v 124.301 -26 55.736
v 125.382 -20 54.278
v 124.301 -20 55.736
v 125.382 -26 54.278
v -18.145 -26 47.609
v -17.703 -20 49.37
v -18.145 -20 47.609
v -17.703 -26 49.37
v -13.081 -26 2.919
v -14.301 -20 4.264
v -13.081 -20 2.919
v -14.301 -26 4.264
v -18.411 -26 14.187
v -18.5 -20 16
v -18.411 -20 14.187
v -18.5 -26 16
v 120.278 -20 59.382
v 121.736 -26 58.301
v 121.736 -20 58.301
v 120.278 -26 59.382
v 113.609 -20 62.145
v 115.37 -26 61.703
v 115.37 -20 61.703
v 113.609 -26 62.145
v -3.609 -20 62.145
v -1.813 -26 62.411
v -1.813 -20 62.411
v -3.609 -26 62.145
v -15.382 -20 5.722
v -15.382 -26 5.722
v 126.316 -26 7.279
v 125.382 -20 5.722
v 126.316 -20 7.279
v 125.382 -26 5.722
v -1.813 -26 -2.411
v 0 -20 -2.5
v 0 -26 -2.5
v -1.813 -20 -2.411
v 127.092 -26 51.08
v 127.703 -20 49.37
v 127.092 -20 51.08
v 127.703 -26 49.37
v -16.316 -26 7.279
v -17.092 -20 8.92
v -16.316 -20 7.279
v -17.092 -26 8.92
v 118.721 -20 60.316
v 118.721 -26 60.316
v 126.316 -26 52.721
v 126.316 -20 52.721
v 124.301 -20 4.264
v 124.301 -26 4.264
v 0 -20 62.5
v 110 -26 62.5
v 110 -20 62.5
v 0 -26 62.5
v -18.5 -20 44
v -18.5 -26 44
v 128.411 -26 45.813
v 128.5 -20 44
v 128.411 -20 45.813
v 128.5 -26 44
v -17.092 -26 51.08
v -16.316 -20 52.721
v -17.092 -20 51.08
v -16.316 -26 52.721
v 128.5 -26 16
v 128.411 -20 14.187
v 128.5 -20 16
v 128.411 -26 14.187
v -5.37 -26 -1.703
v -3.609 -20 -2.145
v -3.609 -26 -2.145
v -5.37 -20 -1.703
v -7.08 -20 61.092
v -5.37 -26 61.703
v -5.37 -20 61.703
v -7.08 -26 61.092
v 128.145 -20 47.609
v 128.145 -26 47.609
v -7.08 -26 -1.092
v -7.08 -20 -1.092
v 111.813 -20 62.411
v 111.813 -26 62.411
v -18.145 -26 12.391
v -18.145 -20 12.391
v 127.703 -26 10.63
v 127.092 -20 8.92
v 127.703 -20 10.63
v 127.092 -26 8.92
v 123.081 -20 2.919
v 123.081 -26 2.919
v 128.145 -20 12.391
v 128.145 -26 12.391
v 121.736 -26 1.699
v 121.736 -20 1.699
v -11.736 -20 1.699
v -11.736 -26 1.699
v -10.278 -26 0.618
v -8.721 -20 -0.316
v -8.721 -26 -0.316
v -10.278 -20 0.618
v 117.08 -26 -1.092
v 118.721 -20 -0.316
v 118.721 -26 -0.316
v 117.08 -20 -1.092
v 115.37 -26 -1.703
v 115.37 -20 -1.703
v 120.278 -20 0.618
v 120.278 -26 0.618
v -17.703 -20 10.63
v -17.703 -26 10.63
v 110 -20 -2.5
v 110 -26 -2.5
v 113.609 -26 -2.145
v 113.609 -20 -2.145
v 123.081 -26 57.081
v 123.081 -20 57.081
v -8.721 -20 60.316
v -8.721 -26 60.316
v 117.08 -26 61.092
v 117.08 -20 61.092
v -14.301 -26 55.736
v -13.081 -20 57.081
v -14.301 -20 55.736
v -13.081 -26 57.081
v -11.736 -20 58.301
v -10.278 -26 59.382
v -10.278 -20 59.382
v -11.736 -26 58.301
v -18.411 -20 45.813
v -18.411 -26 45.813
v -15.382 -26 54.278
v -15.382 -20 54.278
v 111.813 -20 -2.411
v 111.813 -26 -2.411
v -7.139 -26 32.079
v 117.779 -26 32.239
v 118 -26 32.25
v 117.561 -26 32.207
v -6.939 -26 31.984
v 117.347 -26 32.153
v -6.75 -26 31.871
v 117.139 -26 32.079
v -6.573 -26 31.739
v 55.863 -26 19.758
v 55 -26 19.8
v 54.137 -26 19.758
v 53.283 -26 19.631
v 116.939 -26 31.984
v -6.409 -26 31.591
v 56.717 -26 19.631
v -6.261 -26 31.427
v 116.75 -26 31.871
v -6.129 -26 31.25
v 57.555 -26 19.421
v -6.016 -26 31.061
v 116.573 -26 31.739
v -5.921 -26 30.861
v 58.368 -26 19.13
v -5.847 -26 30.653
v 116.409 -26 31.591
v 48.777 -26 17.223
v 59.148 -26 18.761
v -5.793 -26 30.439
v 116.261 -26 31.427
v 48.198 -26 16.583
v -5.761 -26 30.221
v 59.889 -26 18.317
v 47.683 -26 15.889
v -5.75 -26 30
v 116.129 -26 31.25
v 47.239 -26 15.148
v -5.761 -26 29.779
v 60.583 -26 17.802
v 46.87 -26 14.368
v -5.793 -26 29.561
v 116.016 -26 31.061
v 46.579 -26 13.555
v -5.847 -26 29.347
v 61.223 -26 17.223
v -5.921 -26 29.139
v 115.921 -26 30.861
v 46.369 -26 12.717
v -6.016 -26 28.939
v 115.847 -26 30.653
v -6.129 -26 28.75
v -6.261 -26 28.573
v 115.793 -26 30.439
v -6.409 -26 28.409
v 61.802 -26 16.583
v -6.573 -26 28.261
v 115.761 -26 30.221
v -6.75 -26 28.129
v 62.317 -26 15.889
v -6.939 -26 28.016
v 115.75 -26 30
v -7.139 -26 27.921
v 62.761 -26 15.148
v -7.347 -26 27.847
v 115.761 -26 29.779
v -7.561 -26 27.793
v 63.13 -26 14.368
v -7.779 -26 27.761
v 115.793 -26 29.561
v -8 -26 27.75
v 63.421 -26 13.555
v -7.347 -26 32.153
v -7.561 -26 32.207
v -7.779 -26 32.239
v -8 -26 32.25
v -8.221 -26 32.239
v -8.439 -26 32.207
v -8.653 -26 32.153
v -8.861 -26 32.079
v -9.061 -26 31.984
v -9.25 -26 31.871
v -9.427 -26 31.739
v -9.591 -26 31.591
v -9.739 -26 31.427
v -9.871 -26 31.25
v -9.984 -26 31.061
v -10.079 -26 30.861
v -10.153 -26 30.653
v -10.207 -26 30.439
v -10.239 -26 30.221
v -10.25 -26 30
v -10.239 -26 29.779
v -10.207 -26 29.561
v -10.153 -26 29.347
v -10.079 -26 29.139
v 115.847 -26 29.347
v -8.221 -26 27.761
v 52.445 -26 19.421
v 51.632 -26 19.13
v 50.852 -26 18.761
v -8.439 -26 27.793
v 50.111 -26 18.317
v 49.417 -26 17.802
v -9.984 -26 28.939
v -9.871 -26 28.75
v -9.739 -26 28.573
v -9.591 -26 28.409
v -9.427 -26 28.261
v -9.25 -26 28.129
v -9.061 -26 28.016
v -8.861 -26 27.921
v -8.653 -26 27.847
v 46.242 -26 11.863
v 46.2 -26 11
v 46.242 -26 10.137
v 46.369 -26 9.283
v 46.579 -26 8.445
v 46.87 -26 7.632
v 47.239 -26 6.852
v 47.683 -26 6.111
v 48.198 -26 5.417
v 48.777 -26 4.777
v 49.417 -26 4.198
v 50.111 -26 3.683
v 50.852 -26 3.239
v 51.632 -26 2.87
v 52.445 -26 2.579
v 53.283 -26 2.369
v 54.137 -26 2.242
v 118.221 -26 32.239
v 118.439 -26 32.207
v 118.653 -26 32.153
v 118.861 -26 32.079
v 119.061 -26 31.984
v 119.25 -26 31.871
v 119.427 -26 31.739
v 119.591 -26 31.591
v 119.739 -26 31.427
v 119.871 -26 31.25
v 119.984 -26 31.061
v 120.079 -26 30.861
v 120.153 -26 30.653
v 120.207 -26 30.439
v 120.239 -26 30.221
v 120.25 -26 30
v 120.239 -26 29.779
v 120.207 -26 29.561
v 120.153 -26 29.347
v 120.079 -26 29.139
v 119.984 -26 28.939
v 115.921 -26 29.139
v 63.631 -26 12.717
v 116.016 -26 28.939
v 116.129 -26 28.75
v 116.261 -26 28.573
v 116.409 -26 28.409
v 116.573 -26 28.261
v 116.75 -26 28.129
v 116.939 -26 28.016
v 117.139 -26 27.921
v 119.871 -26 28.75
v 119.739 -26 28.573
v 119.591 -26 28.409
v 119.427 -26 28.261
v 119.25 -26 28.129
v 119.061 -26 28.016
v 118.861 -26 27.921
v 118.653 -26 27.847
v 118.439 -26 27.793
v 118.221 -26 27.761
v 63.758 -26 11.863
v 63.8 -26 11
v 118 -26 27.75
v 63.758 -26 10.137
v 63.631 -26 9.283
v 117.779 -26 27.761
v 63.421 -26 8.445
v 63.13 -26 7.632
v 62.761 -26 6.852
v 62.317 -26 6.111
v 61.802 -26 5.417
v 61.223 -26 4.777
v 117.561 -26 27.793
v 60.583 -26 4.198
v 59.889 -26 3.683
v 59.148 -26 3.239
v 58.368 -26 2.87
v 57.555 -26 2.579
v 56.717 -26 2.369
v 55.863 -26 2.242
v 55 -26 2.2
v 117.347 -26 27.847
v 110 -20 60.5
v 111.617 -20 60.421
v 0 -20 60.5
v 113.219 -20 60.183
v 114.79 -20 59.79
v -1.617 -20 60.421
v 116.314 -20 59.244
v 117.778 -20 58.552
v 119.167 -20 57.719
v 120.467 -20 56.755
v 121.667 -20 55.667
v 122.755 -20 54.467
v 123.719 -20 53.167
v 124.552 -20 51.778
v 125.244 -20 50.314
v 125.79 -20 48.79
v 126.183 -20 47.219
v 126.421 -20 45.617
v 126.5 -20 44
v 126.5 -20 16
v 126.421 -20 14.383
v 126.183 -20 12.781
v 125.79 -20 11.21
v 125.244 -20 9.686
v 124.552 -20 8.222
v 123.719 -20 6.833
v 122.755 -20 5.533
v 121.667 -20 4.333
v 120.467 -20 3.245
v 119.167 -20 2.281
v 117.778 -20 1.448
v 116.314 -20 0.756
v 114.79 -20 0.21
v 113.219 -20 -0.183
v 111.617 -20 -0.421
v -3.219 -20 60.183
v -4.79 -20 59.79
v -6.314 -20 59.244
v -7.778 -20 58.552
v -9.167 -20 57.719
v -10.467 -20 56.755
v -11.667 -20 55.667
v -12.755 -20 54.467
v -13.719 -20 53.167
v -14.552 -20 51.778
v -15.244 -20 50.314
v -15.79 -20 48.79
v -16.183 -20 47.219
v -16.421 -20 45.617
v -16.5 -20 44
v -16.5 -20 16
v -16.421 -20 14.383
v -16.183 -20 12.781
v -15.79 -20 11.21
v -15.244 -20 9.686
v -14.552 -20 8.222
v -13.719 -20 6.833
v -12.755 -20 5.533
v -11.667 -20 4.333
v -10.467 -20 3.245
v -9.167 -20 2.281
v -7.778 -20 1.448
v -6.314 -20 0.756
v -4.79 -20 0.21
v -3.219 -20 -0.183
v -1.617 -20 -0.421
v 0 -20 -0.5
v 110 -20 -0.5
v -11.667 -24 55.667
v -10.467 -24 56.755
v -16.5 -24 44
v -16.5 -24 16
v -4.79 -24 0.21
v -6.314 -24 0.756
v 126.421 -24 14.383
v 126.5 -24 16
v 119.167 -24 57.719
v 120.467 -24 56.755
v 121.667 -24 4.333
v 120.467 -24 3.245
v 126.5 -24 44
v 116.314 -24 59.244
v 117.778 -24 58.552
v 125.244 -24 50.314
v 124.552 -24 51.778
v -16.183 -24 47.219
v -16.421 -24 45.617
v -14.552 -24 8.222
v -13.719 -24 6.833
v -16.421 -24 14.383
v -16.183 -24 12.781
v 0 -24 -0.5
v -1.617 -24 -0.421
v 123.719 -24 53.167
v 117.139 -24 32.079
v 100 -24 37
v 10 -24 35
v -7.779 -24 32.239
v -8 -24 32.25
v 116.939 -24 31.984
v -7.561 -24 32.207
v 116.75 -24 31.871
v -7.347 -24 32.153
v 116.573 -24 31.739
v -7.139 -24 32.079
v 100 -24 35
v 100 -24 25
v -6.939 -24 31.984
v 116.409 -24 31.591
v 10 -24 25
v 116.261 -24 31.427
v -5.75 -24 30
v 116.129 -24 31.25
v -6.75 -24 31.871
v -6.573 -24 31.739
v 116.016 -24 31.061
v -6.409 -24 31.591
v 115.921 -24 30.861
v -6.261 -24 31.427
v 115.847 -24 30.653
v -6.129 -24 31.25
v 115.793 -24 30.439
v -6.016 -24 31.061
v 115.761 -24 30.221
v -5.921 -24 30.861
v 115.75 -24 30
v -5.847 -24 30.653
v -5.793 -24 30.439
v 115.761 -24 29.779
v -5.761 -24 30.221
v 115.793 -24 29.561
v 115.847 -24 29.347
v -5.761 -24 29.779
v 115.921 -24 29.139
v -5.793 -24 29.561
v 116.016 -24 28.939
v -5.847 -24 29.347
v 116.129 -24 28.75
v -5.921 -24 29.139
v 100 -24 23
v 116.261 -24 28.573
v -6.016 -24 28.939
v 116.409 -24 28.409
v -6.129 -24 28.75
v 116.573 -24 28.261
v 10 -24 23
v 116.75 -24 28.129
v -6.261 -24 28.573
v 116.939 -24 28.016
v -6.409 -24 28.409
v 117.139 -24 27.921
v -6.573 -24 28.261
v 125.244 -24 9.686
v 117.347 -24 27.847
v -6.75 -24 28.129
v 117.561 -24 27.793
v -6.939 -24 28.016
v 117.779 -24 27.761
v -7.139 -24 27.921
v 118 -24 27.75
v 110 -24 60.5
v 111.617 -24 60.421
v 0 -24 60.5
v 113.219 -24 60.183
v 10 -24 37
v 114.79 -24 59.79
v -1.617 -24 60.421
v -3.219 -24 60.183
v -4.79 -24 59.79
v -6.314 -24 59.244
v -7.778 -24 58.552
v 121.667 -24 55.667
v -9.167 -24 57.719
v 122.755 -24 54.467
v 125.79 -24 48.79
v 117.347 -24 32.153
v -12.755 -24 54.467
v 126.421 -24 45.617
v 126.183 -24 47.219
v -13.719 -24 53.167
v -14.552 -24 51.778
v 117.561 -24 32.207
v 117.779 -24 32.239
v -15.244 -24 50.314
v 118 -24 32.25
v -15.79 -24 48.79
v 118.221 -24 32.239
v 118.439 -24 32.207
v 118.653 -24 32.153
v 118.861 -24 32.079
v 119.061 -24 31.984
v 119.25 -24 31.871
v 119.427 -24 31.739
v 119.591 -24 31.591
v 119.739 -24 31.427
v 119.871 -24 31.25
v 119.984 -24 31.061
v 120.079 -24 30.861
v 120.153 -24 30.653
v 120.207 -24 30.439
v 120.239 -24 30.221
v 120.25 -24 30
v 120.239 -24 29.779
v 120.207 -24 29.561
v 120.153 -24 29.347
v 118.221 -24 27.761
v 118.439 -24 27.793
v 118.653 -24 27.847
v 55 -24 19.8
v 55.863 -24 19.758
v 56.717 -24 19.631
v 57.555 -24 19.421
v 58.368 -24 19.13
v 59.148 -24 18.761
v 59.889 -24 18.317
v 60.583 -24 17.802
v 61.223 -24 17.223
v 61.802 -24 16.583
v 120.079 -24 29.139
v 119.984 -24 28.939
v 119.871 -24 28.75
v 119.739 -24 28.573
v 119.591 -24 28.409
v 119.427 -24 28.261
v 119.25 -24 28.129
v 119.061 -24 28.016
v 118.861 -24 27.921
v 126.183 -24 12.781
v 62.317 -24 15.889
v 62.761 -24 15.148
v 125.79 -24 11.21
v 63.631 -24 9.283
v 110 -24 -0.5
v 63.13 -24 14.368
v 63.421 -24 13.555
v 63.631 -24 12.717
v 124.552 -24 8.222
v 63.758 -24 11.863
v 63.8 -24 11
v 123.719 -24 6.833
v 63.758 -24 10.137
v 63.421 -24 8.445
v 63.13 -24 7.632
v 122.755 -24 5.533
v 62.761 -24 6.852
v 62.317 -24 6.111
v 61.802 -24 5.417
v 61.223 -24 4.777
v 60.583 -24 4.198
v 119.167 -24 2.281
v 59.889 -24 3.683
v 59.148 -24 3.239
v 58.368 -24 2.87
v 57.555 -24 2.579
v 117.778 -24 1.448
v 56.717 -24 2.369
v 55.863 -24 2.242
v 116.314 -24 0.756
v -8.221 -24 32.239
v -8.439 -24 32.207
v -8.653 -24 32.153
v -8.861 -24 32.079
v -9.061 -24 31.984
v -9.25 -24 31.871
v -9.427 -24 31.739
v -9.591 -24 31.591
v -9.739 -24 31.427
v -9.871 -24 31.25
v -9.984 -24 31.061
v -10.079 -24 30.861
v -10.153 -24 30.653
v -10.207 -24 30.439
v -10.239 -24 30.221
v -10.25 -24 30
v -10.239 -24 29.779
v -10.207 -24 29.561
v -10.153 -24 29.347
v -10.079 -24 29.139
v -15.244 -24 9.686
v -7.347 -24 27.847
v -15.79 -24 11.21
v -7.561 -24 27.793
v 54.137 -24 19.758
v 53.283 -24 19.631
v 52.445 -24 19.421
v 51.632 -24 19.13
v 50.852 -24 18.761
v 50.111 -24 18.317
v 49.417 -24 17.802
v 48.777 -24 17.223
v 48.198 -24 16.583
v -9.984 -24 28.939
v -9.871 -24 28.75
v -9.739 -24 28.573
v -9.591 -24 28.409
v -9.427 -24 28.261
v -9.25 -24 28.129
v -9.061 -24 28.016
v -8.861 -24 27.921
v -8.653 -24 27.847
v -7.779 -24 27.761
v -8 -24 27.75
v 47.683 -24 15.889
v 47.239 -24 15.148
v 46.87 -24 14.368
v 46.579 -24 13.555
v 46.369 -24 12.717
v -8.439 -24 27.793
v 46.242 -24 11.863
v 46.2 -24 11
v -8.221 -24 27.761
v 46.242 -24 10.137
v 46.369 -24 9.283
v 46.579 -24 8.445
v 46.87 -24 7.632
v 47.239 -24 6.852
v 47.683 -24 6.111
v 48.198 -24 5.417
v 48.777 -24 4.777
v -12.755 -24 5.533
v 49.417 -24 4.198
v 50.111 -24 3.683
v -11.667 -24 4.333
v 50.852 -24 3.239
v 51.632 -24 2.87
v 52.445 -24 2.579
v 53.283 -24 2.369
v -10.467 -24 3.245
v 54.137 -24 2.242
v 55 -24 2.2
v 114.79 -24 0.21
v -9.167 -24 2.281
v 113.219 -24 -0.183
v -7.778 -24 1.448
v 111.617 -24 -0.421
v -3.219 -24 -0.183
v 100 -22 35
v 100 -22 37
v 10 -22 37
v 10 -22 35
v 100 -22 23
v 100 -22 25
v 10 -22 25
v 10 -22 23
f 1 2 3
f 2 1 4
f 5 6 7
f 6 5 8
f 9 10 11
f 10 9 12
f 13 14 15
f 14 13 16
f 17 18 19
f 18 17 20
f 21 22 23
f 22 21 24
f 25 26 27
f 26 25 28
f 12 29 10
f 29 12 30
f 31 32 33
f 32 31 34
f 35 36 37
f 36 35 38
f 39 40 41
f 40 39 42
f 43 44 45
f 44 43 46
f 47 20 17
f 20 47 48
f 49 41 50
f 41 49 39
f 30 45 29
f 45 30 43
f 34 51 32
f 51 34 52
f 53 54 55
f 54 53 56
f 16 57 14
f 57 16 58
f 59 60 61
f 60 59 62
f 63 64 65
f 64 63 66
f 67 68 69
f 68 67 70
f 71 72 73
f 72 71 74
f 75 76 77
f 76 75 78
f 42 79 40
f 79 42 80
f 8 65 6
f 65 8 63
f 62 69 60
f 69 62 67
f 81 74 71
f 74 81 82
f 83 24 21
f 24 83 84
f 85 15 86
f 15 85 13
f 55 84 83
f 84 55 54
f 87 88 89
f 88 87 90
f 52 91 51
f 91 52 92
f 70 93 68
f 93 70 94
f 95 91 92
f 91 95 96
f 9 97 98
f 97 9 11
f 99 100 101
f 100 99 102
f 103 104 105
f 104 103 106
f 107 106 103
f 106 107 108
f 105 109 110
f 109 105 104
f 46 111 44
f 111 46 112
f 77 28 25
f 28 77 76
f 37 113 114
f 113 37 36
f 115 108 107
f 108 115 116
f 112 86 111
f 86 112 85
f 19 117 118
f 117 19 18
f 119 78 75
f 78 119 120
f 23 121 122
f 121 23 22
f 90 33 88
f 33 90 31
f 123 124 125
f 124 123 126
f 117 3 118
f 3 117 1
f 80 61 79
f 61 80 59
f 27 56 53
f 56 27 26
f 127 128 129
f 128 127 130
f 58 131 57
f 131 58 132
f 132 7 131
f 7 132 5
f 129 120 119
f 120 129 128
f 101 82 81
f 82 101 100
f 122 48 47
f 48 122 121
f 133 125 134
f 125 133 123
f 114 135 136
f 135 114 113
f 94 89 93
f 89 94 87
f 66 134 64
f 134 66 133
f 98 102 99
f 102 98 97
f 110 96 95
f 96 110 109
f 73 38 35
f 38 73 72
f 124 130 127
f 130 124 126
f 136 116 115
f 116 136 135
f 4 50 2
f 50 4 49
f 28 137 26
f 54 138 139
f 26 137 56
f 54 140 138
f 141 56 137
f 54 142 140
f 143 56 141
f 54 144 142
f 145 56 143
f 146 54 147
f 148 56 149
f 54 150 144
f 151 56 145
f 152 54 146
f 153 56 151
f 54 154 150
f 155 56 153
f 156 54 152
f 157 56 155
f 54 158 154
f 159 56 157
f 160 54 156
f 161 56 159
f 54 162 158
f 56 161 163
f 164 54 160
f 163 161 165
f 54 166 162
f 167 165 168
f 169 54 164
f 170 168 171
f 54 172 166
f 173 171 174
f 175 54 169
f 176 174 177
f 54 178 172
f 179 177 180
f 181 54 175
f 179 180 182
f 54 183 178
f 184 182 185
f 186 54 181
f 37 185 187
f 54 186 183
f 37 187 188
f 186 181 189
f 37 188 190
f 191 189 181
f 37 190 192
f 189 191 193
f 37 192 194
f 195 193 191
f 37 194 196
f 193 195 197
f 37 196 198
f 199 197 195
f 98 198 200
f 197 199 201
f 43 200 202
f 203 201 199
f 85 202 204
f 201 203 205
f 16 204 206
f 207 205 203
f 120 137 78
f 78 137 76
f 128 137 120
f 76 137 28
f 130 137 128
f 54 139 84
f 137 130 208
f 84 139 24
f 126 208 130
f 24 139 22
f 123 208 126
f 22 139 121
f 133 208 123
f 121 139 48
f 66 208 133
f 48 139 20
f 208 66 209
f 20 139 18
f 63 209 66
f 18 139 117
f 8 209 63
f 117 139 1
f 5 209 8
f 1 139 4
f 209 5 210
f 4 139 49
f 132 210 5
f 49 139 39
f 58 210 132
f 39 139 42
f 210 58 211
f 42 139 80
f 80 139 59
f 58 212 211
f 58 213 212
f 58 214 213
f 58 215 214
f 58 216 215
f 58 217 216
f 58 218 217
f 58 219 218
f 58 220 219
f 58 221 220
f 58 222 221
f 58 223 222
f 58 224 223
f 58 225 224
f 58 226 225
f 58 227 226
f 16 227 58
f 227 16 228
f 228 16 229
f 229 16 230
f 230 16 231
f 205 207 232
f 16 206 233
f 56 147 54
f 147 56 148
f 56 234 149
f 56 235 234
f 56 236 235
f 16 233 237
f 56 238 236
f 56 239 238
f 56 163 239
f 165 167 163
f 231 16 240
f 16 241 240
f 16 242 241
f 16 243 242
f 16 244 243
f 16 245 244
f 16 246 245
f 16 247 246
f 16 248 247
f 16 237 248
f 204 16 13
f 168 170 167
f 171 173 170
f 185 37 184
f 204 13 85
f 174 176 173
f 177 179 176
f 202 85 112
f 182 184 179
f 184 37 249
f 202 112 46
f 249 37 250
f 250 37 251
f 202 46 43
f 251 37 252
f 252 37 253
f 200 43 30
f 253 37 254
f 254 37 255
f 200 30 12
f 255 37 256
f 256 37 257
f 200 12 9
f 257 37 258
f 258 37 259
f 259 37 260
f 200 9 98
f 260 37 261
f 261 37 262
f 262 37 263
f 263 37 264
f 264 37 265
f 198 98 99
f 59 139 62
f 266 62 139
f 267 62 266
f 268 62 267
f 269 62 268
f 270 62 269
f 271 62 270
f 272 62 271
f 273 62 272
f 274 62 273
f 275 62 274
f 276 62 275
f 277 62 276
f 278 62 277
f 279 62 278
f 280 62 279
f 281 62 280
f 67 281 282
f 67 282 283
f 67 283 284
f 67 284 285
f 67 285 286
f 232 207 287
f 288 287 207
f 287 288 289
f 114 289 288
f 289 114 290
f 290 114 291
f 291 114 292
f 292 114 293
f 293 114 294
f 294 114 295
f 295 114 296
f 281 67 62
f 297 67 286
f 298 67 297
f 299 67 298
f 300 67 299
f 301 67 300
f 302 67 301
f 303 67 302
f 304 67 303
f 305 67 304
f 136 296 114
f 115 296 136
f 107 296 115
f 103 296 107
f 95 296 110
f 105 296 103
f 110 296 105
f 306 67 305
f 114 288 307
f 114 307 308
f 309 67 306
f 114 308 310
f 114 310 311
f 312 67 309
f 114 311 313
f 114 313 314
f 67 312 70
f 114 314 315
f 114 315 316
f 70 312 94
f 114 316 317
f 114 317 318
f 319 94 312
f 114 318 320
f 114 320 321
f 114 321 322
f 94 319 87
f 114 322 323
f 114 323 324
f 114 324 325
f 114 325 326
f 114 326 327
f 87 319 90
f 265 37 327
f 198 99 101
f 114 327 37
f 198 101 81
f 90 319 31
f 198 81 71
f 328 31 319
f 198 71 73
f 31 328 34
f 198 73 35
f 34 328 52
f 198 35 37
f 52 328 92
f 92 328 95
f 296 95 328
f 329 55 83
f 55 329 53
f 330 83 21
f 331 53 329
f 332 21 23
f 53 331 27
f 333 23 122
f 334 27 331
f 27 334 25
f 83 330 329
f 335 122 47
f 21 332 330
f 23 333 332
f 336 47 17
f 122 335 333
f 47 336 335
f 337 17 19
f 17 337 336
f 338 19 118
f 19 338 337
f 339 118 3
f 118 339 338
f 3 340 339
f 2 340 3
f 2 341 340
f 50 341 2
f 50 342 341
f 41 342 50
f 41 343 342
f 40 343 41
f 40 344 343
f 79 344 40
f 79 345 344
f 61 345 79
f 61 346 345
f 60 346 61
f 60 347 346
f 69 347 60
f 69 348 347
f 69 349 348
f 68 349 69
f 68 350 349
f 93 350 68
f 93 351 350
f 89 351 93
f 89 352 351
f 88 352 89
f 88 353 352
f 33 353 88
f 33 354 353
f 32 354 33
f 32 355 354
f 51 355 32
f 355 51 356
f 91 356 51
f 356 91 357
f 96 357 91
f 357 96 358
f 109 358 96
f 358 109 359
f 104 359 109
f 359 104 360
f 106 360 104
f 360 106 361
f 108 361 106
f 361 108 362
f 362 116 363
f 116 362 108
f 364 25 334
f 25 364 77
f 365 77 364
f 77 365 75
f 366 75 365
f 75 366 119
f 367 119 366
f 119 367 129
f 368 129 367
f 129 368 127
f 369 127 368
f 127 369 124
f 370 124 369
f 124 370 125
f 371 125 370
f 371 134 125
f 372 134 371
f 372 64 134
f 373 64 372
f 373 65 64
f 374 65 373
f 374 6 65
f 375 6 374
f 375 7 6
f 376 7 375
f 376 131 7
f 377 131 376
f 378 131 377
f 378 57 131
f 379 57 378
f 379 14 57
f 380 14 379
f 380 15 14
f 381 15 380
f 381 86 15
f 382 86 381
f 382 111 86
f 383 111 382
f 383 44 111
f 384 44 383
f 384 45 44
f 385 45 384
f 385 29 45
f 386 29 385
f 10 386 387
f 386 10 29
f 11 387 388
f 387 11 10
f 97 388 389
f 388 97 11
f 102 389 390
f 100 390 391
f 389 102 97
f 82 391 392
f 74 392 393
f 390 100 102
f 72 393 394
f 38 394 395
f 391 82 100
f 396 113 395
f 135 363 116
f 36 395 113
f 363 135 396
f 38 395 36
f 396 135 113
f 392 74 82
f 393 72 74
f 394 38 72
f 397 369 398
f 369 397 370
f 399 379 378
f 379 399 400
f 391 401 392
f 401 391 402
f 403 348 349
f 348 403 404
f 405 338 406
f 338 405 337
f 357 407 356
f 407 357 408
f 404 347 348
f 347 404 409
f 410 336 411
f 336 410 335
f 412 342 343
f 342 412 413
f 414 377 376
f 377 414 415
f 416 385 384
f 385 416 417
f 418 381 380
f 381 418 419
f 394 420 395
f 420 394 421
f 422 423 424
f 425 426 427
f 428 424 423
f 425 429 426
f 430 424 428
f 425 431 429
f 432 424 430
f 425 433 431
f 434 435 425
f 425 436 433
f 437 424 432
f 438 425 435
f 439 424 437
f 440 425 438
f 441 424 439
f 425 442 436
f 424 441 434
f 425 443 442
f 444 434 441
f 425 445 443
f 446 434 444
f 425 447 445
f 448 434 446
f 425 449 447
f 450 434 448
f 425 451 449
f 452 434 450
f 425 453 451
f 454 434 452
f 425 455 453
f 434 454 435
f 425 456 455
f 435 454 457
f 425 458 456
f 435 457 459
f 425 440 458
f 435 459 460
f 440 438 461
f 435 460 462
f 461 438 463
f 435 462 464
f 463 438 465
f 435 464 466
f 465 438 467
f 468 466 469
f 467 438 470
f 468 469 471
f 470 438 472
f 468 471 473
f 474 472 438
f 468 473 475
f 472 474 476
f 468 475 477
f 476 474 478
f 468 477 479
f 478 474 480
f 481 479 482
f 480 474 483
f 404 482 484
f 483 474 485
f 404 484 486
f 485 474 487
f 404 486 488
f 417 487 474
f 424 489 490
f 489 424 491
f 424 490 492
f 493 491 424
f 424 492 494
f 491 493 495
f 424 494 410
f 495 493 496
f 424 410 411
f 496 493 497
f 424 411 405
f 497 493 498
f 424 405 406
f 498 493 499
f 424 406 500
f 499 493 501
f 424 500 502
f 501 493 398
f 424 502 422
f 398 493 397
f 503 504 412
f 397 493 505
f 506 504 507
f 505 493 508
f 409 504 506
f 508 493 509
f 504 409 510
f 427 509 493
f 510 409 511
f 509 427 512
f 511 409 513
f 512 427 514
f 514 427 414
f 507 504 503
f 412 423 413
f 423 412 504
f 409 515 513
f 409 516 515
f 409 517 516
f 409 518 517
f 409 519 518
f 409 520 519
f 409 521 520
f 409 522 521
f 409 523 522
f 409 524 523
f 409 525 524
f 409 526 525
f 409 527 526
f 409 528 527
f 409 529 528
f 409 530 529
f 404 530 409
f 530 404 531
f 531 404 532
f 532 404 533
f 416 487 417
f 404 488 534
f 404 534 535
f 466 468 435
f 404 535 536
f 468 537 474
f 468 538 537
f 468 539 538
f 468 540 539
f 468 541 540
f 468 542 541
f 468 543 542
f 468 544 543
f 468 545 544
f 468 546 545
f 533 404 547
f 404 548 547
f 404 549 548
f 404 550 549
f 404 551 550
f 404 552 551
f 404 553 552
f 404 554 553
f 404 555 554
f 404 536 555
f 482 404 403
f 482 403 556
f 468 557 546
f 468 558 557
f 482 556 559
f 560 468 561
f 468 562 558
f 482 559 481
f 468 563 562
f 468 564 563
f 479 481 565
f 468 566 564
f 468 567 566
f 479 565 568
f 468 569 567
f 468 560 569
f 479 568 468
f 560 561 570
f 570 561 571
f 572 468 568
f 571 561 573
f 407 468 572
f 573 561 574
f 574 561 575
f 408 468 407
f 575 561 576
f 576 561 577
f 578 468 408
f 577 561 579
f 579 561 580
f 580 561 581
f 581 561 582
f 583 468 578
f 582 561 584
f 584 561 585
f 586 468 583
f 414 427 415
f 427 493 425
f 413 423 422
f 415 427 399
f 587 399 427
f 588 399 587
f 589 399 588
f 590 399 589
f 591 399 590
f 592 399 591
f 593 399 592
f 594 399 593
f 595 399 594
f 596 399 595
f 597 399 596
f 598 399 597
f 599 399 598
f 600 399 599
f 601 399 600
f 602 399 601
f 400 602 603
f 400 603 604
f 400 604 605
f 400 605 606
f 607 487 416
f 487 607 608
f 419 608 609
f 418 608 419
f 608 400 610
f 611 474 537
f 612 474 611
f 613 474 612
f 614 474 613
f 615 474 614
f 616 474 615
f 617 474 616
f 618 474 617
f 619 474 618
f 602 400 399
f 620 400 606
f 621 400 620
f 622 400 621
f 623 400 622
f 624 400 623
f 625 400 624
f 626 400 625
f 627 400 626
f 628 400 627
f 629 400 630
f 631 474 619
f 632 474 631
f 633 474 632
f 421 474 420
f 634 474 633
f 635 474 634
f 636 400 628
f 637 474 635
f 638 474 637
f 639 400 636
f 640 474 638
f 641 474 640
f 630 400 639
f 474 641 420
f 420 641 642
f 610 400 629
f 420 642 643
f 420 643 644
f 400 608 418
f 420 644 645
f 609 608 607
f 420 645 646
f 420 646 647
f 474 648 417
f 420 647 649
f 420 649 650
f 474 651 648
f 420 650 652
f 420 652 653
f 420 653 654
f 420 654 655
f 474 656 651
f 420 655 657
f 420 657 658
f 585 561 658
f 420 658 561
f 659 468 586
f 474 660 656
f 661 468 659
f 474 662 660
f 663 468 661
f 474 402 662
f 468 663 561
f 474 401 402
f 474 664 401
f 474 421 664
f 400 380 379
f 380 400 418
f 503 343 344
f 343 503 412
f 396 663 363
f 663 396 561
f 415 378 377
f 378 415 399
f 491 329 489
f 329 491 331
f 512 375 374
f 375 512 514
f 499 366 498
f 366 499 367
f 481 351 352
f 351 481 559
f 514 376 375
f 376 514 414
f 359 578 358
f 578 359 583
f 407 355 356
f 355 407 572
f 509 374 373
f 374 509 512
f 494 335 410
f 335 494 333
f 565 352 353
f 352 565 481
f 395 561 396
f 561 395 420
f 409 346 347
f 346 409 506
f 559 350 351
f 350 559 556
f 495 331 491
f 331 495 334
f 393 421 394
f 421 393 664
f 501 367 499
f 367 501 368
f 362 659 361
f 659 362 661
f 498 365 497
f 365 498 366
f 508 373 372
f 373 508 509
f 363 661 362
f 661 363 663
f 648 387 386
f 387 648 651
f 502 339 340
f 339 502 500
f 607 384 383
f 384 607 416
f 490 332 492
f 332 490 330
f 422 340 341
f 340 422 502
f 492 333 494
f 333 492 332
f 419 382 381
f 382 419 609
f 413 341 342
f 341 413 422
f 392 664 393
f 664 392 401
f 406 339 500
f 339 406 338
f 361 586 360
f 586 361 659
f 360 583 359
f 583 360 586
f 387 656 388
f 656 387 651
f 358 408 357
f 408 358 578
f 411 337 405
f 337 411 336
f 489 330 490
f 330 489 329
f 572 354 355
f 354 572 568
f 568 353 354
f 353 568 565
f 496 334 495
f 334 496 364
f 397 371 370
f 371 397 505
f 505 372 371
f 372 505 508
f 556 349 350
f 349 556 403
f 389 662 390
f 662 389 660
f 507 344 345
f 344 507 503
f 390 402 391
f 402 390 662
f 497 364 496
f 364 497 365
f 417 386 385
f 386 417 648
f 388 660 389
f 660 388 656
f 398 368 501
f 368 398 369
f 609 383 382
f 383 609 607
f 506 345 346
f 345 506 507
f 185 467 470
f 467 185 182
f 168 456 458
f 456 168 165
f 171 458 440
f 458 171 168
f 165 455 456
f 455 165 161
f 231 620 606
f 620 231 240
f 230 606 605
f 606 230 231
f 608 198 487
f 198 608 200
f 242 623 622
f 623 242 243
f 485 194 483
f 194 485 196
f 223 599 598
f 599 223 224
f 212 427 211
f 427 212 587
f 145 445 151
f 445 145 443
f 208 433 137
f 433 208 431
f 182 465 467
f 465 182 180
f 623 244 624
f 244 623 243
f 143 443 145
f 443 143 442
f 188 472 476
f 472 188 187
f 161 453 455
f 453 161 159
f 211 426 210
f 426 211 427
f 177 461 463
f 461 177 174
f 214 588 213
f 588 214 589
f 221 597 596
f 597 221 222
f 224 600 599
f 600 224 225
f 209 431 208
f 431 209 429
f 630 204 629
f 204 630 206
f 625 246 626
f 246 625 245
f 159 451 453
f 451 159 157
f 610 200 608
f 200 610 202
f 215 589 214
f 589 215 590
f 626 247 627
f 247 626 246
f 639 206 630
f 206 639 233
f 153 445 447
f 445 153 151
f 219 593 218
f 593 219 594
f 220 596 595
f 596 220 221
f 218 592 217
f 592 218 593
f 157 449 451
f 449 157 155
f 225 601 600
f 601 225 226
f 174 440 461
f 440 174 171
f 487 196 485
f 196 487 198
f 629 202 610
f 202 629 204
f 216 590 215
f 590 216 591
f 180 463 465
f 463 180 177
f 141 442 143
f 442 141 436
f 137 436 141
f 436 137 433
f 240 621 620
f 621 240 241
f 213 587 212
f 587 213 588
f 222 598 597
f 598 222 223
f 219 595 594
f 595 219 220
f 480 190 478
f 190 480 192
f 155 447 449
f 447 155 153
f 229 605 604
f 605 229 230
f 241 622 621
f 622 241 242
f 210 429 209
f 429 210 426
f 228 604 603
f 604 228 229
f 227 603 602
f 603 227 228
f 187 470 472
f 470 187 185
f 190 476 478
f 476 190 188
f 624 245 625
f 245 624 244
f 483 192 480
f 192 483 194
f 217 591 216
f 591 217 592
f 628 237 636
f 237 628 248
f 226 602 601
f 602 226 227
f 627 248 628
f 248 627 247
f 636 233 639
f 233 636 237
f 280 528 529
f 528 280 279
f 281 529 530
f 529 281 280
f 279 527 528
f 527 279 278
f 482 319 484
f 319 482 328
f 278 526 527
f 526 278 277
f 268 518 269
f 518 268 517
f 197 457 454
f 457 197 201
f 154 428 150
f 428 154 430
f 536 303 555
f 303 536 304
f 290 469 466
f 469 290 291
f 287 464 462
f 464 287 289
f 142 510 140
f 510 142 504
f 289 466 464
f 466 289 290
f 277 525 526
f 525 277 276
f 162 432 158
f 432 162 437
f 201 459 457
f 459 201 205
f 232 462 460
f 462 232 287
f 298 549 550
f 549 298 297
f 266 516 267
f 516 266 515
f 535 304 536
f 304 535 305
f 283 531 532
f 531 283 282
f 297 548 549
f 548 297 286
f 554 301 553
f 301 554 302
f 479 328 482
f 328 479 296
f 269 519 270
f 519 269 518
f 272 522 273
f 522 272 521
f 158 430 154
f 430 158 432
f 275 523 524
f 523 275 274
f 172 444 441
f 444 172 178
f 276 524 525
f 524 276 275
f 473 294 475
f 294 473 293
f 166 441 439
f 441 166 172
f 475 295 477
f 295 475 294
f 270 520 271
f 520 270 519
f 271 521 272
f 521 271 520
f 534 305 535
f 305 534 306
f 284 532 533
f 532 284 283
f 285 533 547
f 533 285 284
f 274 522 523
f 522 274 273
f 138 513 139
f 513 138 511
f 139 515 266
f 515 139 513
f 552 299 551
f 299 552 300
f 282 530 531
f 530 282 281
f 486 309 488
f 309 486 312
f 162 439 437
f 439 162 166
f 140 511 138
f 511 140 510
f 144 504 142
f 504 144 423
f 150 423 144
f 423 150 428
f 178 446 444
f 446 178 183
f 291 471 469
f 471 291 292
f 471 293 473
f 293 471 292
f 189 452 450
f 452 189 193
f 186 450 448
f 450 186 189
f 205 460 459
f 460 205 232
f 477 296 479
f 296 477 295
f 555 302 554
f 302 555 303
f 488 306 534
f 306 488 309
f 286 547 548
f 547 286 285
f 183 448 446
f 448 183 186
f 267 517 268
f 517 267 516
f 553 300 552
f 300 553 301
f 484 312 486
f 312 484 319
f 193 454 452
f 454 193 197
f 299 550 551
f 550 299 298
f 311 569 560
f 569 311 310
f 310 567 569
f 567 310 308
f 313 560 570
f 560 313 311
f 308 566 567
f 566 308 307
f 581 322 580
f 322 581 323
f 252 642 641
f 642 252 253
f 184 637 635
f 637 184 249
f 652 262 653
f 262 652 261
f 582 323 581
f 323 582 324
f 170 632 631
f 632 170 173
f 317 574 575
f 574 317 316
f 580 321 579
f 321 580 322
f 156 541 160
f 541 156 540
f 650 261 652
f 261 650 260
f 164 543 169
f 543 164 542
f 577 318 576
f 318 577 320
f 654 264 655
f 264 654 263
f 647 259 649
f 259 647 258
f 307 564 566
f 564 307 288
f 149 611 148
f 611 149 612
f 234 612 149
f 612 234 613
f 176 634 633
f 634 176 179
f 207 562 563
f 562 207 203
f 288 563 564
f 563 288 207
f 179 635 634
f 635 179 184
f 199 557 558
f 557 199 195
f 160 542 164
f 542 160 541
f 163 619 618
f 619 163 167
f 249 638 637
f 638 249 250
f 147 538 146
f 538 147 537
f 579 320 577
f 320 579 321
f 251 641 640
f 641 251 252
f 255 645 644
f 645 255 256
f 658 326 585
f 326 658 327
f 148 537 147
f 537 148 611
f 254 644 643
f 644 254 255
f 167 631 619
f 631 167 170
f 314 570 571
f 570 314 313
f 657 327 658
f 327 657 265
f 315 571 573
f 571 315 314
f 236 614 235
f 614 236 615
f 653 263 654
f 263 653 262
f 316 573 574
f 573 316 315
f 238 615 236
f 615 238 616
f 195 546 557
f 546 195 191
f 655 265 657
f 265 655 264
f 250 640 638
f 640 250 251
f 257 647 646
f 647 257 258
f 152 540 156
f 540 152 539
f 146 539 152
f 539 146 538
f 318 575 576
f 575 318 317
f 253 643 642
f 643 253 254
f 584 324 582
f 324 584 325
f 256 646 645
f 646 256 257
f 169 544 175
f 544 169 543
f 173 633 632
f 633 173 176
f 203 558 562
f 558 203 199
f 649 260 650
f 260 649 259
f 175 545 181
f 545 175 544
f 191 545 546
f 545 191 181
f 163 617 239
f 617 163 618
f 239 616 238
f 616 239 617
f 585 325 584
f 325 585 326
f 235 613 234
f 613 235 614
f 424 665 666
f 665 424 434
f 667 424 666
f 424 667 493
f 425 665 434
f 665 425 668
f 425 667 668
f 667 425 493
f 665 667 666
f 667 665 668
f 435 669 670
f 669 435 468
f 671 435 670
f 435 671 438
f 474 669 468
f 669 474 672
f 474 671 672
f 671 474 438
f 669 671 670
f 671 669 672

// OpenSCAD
// vacuum transformer holder


SOCKET_THICKNESS = 2;
SOCKET_FUDGE = 1;
SOCKET_X = 85 + SOCKET_FUDGE;
SOCKET_Y = 31 + SOCKET_FUDGE;
SOCKET_Z = 50;

M3_HEAD_Z = 3;
M3_HEAD_DIAM = 5.5;
M3_SHAFT_DIAM = 3;

TRAPEZOID_X = SOCKET_X - SOCKET_Y - 2;
TRAPEZOID_Y = 5;
TRAPEZOID_FUDGE = 1;




KNOB_ROD_DIAM = 6;
KNOB_ROD_FUDGE = 0.2;
KNOB_ROD_FLAT_DIAM = 4.5;
KNOB_ROD_FLAT_HEIGHT = 10;
KNOB_ROD_HEIGHT = 20;
KNOB_WALL_PADDING = 4;
KNOB_CEILING_PADDING = 4;

KNOB_DIAM = 40;

KNOB_PADDING = KNOB_DIAM * 0.25;
KNOB_INDENT = 3;
KNOB_CLEARANCE = 3;
KNOB_HEIGHT = KNOB_CEILING_PADDING + KNOB_ROD_HEIGHT - (SOCKET_THICKNESS + KNOB_CLEARANCE);
KNOB_CURL_DIAM = 10;

CUBE_X = (2 * KNOB_DIAM) + (3 * KNOB_PADDING);
CUBE_Y = 2 * TRAPEZOID_Y;
CUBE_Z = KNOB_DIAM + (2 * KNOB_PADDING);


module torus(d1, d2) {
    rotate_extrude($fn=128) {
        translate([d1 * 0.5, 0, 0]) circle(d=KNOB_CURL_DIAM, $fn=64);
    }
}

module knob_shell(d, h) {
    union() {
        _KNOB_HEIGHT_ADJUSTED = h - (0.5 * KNOB_CURL_DIAM);
        translate([0, 0, _KNOB_HEIGHT_ADJUSTED]) hull() torus(d - KNOB_CURL_DIAM, KNOB_CURL_DIAM);
        cylinder(d=d, h=_KNOB_HEIGHT_ADJUSTED, $fn=128);
    }
}

module knob() {
    difference() {
        union() {
            difference () {
                knob_shell(KNOB_DIAM, KNOB_HEIGHT);
                translate([0, 0, -1 * KNOB_CEILING_PADDING]) knob_shell(KNOB_DIAM - (2 * KNOB_WALL_PADDING), KNOB_HEIGHT);
            }
            // rod holder
            translate([0, 0, KNOB_HEIGHT - (KNOB_CEILING_PADDING + KNOB_ROD_FLAT_HEIGHT)]) difference() {
                cylinder(h=KNOB_ROD_FLAT_HEIGHT, d=KNOB_ROD_DIAM + (2 * KNOB_WALL_PADDING), $fn=64);
                difference() {
                    _rod_diam = KNOB_ROD_DIAM + (2 * KNOB_ROD_FUDGE);
                    cylinder(h=KNOB_ROD_FLAT_HEIGHT, d=_rod_diam, $fn=64);
                    translate([(0.5 * _rod_diam) - (KNOB_ROD_DIAM - KNOB_ROD_FLAT_DIAM) + KNOB_ROD_FUDGE, -0.5 * _rod_diam, 0]) cube([_rod_diam, _rod_diam, KNOB_ROD_FLAT_HEIGHT]);
                }
            }
        }
    
        
        
        NUM_DENTS = 12;
        ROT_FRAC = 360.0 / NUM_DENTS;
        for(i=[0:1:NUM_DENTS]) {
            rotate([0, 0, i * ROT_FRAC]) scale([1, 1, 1]) translate([0.55 * KNOB_DIAM, 0, 0.85 * KNOB_HEIGHT]) sphere(d=KNOB_CURL_DIAM, $fn=128);
        }
        
    }
}

module mount() {

    WING_DIAM = SOCKET_Y;
    WING_THICKNESS = CUBE_Y - (TRAPEZOID_Y + TRAPEZOID_FUDGE);
    
    SCREW_INSET_DIAM=10;
    SCREW_DIAM = 4.5;
    
    ENCODER_X = 13;
    
    
    union() {
        difference() {
            union() {
                hull() {
                    cube([CUBE_X, CUBE_Y, CUBE_Z]);
                    hull() {
                        for(i=[0:1:3]) {
                            translate([floor(i / 2) * CUBE_X, 0, (i % 2) * CUBE_Z + ((i%2) * -1 * WING_DIAM) + (0.5 * WING_DIAM)]) rotate([90, 0, 0]) cylinder(d=WING_DIAM, h=WING_THICKNESS, $fn=64);
                        }
                    }
                }
                
                // inset rings
                translate([(0.5 * KNOB_DIAM) + KNOB_PADDING, CUBE_Y, 0.5 * CUBE_Z]) rotate([-90, 0, 0]) difference() {
                    cylinder(d=KNOB_DIAM + 5, h=3, $fn=64);
                    cylinder(d=KNOB_DIAM + 1, h=3, $fn=64);
                }
                translate([(1.5 * KNOB_DIAM) + (2 * KNOB_PADDING), CUBE_Y, 0.5 * CUBE_Z]) rotate([-90, 0, 0]) difference() {
                    cylinder(d=KNOB_DIAM + 5, h=3, $fn=64);
                    cylinder(d=KNOB_DIAM + 1, h=3, $fn=64);
                }
            }
            translate([SOCKET_THICKNESS, -1 * WING_THICKNESS, SOCKET_THICKNESS]) cube([CUBE_X - (SOCKET_THICKNESS * 2), CUBE_Y + WING_THICKNESS - SOCKET_THICKNESS, CUBE_Z - (SOCKET_THICKNESS * 2)]);

            ENCODER_SCREW_HOLE_DIAM = 8.5;
            translate([(0.5 * KNOB_DIAM) + KNOB_PADDING, 0, 0.5 * CUBE_Z]) rotate([-90, 0, 0]) cylinder(d=ENCODER_SCREW_HOLE_DIAM, h=CUBE_Y + WING_THICKNESS, $fn=64);
            translate([(1.5 * KNOB_DIAM) + (2 * KNOB_PADDING), 0, 0.5 * CUBE_Z]) rotate([-90, 0, 0]) cylinder(d=ENCODER_SCREW_HOLE_DIAM, h=CUBE_Y + WING_THICKNESS, $fn=64);

            //translate([0.5 * (CUBE_X - (TRAPEZOID_X + (2 * TRAPEZOID_FUDGE))), CUBE_Y, SOCKET_THICKNESS]) _mounting_trapezoid(TRAPEZOID_X + (4 * TRAPEZOID_FUDGE), TRAPEZOID_Y + TRAPEZOID_FUDGE, SOCKET_Z);
            
            // screw one
            translate([-0.25 * WING_DIAM, CUBE_Y, 0.5 * CUBE_Z]) rotate([90, 0, 0]) union() {
                cylinder(h=CUBE_Y, d=SCREW_INSET_DIAM, $fn=64);
                cylinder(h=2 * CUBE_Y, d=SCREW_DIAM, $fn=64);
            }
            
            // screw two
            translate([(0.25 * WING_DIAM) + CUBE_X, CUBE_Y, 0.5 * CUBE_Z]) rotate([90, 0, 0]) union() {
                cylinder(h=CUBE_Y, d=SCREW_INSET_DIAM, $fn=64);
                cylinder(h=2 * CUBE_Y, d=SCREW_DIAM, $fn=64);
            }
        }
        // encoder socket bars
        translate([(0.5 * KNOB_DIAM) + KNOB_PADDING - (0.5 * ENCODER_X) - SOCKET_THICKNESS, 0, 0]) difference() {
            cube([ENCODER_X + (2 * SOCKET_THICKNESS), CUBE_Y, CUBE_Z]);
            translate([SOCKET_THICKNESS, 0, 0]) cube([ENCODER_X, CUBE_Y, CUBE_Z]);
        }
        translate([(1.5 * KNOB_DIAM) + (2 * KNOB_PADDING) - (0.5 * ENCODER_X) - SOCKET_THICKNESS, 0, 0]) difference() {
            cube([ENCODER_X + (2 * SOCKET_THICKNESS), CUBE_Y, CUBE_Z]);
            translate([SOCKET_THICKNESS, 0, 0]) cube([ENCODER_X, CUBE_Y, CUBE_Z]);
        }
            
    }
}

module tray() {
    
    WING_DIAM = SOCKET_Y;
    WING_THICKNESS = CUBE_Y - (TRAPEZOID_Y + TRAPEZOID_FUDGE);
    
    SCREW_INSET_DIAM=10;
    SCREW_DIAM = 4.5;
    
    ENCODER_X = 13;

    LED_STRIP_CHANNEL_WIDTH_Z = 11 + SOCKET_FUDGE;
    LED_STRIP_CHANNEL_EDGE_HEIGHT = 2;
    LED_STRIP_CHANNEL_EDGE_WIDTH = 2;
    LED_STRIP_CHANNEL_BUFFER_X = 10;

    union() {
        difference() {
            hull() {
                for(i=[0:1:3]) {
                    translate([floor(i / 2) * CUBE_X, 0, (i % 2) * CUBE_Z + ((i%2) * -1 * WING_DIAM) + (0.5 * WING_DIAM)]) rotate([90, 0, 0]) cylinder(d=WING_DIAM + SOCKET_FUDGE + (2 * SOCKET_THICKNESS), h=WING_THICKNESS + SOCKET_THICKNESS, $fn=64);
                }
            }
            hull() {
                for(i=[0:1:3]) {
                    translate([floor(i / 2) * CUBE_X, 0, (i % 2) * CUBE_Z + ((i%2) * -1 * WING_DIAM) + (0.5 * WING_DIAM)]) rotate([90, 0, 0]) cylinder(d=WING_DIAM + SOCKET_FUDGE, h=WING_THICKNESS, $fn=64);
                }
            }
            
            // screw one
            translate([-0.25 * WING_DIAM, CUBE_Y, 0.5 * CUBE_Z]) rotate([90, 0, 0]) union() {
                //cylinder(h=CUBE_Y, d=SCREW_INSET_DIAM, $fn=64);
                cylinder(h=2 * CUBE_Y, d=SCREW_DIAM, $fn=64);
            }
            
            // screw two
            translate([(0.25 * WING_DIAM) + CUBE_X, CUBE_Y, 0.5 * CUBE_Z]) rotate([90, 0, 0]) union() {
                //cylinder(h=CUBE_Y, d=SCREW_INSET_DIAM, $fn=64);
                cylinder(h=2 * CUBE_Y, d=SCREW_DIAM, $fn=64);
            }
            
            AREA_OUTSIDE_CHANNEL_Z = 0.5 * (CUBE_Z - (LED_STRIP_CHANNEL_WIDTH_Z + (2 * LED_STRIP_CHANNEL_EDGE_WIDTH)));
            EXIT_HOLE_DIAM = 0.8 * AREA_OUTSIDE_CHANNEL_Z;
            #translate([0.5 * CUBE_X, -1 * (WING_THICKNESS + SOCKET_THICKNESS), 0.5 * AREA_OUTSIDE_CHANNEL_Z]) rotate([-90, 0, 0]) cylinder(d=EXIT_HOLE_DIAM, h=WING_THICKNESS, $fn=64);
        }
        
        translate([LED_STRIP_CHANNEL_BUFFER_X, -1 * WING_THICKNESS, (0.5 * (CUBE_Z + LED_STRIP_CHANNEL_WIDTH_Z)) + (-0.5 * LED_STRIP_CHANNEL_EDGE_WIDTH)]) {
            // strip channel edge (top)
            cube([CUBE_X - (2 * LED_STRIP_CHANNEL_BUFFER_X), LED_STRIP_CHANNEL_EDGE_HEIGHT, LED_STRIP_CHANNEL_EDGE_WIDTH]);
            
            // strip channel edge (bottom)
            translate([0, 0, -1 * LED_STRIP_CHANNEL_WIDTH_Z]) cube([CUBE_X - (2 * LED_STRIP_CHANNEL_BUFFER_X), LED_STRIP_CHANNEL_EDGE_HEIGHT, LED_STRIP_CHANNEL_EDGE_WIDTH]);
        }        
    }
}

//mount();
translate([0, -20, 0]) tray();
//knob();
//translate([(0.5 * KNOB_DIAM) + KNOB_PADDING, CUBE_Y, 0.5 * CUBE_Z]) rotate([-90, 0, 0]) knob();
//translate([(1.5 * KNOB_DIAM) + (2 * KNOB_PADDING), CUBE_Y, 0.5 * CUBE_Z]) rotate([-90, 0, 0]) knob();
